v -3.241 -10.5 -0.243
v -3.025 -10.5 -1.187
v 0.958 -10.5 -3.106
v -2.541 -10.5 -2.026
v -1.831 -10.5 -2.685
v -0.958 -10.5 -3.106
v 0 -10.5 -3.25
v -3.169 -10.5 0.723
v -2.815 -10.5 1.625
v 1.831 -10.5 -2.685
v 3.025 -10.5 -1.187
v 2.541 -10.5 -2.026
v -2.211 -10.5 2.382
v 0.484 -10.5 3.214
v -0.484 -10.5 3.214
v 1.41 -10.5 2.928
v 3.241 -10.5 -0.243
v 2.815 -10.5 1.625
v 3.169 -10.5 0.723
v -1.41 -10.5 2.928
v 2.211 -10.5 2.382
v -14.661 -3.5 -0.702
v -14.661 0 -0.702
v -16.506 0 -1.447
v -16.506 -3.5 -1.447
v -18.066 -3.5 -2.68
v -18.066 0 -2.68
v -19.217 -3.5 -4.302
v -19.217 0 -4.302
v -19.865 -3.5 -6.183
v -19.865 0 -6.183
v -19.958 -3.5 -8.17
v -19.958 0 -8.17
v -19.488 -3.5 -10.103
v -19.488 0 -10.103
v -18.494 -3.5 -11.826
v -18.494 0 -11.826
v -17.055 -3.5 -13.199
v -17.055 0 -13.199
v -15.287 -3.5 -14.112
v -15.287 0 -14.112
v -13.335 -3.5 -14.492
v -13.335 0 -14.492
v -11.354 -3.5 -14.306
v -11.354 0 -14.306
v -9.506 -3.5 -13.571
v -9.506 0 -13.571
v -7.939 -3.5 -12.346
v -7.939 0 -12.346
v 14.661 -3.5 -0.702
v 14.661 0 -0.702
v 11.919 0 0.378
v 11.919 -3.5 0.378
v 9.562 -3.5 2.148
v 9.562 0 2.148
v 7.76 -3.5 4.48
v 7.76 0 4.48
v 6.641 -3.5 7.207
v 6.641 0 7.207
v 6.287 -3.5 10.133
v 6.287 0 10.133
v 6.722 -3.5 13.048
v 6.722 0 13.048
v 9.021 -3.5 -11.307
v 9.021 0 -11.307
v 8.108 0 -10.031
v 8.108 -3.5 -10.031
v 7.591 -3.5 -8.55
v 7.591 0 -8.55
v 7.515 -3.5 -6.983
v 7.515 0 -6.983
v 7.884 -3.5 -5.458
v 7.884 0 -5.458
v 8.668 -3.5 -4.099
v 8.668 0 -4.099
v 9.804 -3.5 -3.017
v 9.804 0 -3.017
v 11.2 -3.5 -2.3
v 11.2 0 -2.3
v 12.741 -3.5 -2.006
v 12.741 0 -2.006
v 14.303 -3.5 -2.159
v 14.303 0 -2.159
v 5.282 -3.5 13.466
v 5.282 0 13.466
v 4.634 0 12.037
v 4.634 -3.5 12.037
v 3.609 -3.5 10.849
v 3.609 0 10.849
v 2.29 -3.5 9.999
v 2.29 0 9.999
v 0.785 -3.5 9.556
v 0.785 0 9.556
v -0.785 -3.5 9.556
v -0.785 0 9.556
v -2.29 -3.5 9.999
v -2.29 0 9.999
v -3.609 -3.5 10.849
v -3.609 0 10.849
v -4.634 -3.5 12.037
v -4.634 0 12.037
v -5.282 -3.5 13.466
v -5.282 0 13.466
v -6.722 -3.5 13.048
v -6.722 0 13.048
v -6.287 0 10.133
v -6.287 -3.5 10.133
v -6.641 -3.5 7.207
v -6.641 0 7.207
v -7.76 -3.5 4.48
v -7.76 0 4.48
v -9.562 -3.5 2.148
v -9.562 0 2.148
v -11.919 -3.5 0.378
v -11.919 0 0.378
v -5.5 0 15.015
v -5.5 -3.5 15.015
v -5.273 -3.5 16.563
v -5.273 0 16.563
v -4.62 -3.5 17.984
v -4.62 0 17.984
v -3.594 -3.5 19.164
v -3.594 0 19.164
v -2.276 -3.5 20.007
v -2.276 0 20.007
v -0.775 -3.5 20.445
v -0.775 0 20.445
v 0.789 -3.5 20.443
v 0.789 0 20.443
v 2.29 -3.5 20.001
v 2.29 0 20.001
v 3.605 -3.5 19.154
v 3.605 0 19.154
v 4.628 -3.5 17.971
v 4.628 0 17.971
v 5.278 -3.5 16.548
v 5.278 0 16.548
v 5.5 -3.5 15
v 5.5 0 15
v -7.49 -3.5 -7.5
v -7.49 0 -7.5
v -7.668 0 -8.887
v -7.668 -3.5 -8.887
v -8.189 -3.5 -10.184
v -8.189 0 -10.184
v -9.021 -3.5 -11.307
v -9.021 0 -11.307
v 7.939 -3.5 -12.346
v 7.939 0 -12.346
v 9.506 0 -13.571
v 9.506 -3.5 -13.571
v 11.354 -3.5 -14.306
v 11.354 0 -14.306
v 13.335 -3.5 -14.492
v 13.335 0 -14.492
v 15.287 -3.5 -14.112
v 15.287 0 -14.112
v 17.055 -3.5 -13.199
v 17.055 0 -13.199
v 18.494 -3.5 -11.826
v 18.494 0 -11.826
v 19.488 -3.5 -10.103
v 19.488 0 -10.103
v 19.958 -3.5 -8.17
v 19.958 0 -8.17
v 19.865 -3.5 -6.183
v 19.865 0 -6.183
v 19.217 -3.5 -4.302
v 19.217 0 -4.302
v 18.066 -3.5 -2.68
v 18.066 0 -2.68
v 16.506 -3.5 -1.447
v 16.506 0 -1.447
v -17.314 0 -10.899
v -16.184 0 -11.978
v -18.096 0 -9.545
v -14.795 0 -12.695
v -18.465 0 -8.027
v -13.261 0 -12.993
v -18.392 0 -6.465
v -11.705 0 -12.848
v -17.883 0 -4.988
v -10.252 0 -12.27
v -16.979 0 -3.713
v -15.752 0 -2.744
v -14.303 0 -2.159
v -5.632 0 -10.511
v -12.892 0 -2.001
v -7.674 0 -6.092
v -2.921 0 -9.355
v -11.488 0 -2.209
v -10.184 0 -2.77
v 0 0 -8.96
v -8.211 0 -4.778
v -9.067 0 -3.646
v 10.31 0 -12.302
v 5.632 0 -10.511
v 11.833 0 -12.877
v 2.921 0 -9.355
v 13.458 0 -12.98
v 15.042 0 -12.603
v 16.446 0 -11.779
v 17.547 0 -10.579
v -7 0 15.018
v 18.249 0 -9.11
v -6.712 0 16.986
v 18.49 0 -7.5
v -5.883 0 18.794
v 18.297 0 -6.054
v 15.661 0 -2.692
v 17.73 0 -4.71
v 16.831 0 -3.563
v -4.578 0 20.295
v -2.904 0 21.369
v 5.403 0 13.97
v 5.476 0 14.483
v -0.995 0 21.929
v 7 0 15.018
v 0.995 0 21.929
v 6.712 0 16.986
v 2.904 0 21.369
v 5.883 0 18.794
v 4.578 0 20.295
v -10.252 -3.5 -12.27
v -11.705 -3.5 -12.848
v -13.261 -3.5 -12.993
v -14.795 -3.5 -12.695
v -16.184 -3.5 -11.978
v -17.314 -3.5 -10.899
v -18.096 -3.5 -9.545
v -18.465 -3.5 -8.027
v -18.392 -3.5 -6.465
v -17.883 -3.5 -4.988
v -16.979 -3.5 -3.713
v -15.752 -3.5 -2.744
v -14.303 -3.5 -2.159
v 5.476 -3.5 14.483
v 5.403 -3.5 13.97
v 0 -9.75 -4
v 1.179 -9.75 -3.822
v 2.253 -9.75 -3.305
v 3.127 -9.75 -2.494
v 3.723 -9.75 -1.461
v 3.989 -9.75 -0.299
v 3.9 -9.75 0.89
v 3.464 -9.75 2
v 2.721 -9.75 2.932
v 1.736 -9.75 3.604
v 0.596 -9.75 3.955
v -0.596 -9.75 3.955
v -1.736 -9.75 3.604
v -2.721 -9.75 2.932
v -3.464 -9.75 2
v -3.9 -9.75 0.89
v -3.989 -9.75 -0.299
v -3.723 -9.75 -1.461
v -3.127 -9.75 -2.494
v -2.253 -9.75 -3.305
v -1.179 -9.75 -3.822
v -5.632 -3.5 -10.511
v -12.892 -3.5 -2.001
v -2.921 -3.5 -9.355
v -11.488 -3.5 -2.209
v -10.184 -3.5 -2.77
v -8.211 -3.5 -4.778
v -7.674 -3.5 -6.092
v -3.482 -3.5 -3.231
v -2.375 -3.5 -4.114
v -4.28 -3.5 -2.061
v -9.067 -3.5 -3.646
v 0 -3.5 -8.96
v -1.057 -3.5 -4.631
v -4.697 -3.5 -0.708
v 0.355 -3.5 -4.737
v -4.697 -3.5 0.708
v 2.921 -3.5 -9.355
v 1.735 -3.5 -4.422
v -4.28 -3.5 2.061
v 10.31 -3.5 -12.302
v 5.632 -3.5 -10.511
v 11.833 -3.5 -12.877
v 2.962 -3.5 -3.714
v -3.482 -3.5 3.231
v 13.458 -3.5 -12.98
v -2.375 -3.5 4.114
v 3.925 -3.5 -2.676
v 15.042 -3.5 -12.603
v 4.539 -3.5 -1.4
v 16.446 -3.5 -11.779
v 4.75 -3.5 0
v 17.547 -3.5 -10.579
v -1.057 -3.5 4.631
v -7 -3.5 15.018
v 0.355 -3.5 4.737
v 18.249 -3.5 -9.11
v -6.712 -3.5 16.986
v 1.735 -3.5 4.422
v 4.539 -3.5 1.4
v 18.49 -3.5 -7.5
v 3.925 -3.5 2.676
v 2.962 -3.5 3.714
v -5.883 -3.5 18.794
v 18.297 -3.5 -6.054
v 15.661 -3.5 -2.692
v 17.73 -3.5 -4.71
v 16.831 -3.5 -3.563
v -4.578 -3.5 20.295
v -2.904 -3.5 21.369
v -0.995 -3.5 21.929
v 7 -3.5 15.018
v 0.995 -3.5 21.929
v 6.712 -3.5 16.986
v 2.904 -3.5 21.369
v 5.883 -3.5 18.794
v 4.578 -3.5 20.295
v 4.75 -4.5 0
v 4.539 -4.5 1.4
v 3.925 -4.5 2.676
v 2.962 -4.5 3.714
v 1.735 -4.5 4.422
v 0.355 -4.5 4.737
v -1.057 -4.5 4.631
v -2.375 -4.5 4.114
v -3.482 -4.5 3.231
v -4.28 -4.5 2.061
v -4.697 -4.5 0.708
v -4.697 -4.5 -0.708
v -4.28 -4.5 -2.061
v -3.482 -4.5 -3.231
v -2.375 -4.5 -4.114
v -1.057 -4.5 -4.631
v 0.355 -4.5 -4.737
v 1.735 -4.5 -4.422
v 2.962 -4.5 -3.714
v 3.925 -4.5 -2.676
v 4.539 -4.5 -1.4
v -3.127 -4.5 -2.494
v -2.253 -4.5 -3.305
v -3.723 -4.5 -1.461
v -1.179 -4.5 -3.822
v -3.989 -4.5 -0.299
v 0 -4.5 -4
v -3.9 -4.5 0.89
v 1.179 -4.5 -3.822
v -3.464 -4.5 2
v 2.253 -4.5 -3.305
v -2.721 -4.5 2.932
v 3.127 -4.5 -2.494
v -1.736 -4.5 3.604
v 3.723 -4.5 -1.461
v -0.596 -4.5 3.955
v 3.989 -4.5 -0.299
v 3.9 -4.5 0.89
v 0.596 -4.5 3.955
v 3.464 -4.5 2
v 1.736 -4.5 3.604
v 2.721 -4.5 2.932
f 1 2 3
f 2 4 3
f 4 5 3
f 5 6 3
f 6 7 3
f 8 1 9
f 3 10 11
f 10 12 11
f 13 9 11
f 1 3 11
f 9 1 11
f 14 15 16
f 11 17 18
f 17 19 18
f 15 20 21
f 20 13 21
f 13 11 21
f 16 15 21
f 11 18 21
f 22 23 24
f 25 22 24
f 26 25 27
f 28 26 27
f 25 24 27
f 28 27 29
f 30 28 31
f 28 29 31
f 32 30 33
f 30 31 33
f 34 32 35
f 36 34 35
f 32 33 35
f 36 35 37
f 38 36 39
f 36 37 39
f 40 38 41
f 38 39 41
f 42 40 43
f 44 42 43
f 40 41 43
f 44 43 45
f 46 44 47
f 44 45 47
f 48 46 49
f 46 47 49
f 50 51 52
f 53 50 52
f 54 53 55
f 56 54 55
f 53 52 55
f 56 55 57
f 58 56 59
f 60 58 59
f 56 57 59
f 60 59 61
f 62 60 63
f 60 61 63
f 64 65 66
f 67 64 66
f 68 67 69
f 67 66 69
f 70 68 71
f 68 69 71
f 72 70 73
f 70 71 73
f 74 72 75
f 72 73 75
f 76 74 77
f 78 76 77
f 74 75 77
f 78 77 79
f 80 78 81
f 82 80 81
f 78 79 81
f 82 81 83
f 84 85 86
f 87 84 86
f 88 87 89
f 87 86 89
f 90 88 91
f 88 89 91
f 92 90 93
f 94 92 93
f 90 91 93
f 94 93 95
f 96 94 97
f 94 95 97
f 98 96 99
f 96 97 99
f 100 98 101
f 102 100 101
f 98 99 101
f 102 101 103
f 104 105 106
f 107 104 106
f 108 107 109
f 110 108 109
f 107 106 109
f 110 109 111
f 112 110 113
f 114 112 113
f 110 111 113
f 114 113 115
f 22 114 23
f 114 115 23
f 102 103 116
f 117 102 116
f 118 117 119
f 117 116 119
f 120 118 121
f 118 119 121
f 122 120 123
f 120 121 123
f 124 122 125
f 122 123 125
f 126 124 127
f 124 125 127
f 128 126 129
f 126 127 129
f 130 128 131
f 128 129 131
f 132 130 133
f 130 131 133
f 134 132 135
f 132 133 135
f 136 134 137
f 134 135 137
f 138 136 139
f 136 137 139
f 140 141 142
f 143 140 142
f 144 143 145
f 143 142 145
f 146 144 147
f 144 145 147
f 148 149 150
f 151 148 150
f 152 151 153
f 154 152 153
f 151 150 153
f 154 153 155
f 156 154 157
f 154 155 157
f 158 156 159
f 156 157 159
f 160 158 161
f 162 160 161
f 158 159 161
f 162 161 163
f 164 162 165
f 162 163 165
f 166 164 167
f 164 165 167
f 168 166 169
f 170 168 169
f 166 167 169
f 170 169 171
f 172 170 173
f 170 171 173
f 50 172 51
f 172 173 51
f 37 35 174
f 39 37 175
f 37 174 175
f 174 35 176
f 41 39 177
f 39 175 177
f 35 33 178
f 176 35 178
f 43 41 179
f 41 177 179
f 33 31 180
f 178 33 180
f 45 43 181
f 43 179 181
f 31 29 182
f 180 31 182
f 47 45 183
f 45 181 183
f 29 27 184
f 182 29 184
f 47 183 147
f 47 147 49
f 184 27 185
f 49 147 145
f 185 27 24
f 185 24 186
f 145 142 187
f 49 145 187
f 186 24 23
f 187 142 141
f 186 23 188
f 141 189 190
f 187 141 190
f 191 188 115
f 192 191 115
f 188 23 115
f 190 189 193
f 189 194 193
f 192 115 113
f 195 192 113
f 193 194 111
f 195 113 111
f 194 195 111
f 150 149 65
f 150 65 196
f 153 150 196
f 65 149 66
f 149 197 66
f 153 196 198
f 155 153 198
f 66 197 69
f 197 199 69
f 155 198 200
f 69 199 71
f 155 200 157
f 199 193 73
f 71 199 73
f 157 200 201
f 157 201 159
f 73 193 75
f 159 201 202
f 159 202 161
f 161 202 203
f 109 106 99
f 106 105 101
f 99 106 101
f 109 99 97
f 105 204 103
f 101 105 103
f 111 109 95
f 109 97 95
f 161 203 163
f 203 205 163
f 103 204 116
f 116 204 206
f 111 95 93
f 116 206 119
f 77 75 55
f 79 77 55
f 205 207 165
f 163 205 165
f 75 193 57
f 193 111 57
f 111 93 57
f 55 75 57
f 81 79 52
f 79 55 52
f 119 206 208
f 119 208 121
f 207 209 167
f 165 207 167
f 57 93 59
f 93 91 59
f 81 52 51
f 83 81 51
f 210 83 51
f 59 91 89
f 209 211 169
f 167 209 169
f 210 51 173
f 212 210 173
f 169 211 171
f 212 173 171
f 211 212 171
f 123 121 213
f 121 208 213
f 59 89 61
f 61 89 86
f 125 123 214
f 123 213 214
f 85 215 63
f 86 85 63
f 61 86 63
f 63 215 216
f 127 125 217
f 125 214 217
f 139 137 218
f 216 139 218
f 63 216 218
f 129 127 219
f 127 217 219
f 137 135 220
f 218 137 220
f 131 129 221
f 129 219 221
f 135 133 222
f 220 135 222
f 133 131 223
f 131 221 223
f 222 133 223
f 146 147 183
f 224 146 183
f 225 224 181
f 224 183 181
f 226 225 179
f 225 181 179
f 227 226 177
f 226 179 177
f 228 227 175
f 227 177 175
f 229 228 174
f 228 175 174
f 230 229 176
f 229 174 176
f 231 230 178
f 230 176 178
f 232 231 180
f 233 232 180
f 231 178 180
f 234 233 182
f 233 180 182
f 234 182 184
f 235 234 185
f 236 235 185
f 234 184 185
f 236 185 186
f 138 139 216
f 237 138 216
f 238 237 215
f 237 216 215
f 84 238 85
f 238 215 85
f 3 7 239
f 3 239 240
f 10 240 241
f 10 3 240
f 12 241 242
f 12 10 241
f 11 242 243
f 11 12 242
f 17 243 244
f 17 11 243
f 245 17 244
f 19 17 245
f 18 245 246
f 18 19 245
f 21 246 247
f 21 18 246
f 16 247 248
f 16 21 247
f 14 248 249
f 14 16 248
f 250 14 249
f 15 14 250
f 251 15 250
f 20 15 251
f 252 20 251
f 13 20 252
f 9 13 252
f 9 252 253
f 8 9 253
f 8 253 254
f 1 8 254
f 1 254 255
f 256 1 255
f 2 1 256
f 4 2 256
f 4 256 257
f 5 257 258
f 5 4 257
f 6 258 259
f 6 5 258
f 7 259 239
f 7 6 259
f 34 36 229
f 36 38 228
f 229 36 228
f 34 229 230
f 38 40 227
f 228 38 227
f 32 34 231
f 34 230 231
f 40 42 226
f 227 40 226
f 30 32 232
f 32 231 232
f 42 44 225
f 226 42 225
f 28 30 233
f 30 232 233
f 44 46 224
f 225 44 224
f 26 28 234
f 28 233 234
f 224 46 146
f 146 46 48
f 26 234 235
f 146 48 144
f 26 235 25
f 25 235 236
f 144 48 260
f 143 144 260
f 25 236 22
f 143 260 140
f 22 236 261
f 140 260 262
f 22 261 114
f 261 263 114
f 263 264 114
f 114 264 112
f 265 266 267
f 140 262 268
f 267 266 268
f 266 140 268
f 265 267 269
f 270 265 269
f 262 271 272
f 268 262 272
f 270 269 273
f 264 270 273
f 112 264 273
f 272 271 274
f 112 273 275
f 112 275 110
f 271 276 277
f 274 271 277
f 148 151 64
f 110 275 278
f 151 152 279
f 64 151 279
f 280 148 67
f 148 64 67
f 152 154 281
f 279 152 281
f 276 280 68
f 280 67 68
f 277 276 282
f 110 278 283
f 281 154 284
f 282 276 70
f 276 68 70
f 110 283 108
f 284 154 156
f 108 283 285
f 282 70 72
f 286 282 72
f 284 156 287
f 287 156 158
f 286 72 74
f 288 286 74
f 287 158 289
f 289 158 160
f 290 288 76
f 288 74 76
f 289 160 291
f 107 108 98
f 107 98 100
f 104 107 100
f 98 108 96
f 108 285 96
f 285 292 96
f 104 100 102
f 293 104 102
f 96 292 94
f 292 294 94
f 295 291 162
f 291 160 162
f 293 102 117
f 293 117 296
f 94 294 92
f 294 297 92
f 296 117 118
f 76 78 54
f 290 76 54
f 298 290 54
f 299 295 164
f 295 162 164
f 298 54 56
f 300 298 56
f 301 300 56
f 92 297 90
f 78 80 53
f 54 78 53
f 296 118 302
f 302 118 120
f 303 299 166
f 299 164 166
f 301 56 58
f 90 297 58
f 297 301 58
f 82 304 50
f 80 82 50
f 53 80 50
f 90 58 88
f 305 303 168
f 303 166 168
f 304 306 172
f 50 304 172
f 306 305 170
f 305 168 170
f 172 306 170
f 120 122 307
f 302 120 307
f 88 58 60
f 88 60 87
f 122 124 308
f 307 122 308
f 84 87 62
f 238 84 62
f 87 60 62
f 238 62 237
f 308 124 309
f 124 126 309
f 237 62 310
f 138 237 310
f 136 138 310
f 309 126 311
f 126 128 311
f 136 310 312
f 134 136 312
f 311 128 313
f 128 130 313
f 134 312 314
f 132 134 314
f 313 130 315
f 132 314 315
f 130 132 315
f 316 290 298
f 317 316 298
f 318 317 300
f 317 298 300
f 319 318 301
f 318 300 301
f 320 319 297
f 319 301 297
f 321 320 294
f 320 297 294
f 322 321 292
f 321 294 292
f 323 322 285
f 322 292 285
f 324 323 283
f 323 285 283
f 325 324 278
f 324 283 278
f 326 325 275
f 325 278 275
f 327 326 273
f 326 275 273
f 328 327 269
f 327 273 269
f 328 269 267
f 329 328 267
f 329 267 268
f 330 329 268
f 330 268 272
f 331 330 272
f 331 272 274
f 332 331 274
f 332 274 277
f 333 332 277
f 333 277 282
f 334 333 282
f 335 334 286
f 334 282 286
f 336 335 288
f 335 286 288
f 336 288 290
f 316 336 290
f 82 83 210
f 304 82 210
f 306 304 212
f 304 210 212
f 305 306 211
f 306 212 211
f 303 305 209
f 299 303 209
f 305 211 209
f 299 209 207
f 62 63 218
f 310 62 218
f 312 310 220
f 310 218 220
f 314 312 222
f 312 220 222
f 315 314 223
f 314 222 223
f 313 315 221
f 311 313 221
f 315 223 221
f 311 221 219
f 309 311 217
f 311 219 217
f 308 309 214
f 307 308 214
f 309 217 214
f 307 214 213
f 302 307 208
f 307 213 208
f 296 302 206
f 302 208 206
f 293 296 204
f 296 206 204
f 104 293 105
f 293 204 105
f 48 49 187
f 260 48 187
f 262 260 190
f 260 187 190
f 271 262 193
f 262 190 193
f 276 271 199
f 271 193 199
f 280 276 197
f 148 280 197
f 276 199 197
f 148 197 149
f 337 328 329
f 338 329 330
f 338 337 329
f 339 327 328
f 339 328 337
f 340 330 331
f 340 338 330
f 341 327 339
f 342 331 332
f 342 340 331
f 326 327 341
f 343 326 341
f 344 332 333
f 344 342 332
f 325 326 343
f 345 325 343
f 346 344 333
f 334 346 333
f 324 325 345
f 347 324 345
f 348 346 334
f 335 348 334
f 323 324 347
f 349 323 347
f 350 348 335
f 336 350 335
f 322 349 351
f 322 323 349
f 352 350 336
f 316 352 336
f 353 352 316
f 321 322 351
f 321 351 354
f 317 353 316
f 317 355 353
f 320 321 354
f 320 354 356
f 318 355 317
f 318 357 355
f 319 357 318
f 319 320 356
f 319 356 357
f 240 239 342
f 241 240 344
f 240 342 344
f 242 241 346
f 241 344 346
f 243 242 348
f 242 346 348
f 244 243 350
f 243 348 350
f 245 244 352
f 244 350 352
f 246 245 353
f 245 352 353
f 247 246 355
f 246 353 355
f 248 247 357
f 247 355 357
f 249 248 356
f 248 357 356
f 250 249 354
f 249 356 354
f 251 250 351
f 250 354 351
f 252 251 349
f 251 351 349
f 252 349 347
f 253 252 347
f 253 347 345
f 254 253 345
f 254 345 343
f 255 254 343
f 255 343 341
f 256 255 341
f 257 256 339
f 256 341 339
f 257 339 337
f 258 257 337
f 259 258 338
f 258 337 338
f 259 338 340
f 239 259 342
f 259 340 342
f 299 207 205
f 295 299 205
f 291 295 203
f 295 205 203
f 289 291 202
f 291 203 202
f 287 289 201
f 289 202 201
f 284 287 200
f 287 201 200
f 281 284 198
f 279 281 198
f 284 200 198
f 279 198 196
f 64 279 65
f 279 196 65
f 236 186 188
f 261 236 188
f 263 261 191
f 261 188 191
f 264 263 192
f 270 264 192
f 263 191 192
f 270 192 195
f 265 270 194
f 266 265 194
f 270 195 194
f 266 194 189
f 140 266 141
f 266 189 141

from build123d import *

# Parameters (mm, degrees)
F0_R     = 11
F1_DEPTH = 7
F2_SCALE = 0.5
F5_R     = 4.75
F5_R_2   = 4
F6_DEPTH = 1
F7_SIZE  = 0.75


with BuildPart() as f1:
    # F0 (on Front) → F1 (new body)
    with BuildSketch(Plane.XZ):
        with BuildLine():
            ThreePointArc((29.3216524239, -1.4044694133), (15.5190640284, 8.9599357944), (13.4445200212, 26.0955305867))
            ThreePointArc((13.4445200212, 26.0955305867), (0, 44), (-13.4445200212, 26.0955305867))
            ThreePointArc((-13.4445200212, 26.0955305867), (-15.5190640284, 8.9599357944), (-29.3216524239, -1.4044694133))
            ThreePointArc((-29.3216524239, -1.4044694133), (-38.1051177665, -22), (-15.8771324027, -24.6910611734))
            ThreePointArc((-15.8771324027, -24.6910611734), (0, -17.9198715888), (15.8771324027, -24.6910611734))
            ThreePointArc((15.8771324027, -24.6910611734), (38.1051177665, -22), (29.3216524239, -1.4044694133))
        make_face()
        with BuildLine():
            ThreePointArc((11, 30), (10.8903412687, 28.4506559287), (10.5635514452, 26.9322026038))
            ThreePointArc((10.5635514452, 26.9322026038), (12.9209878171, 7.4599357944), (28.6057473574, -4.3177973962))
            ThreePointArc((28.6057473574, -4.3177973962), (34.6374022725, -8.2130580407), (36.9807621135, -15))
            ThreePointArc((36.9807621135, -15), (30.084161423, -25.2059842302), (18.0421959122, -22.6144052077))
            ThreePointArc((18.0421959122, -22.6144052077), (0, -14.9198715888), (-18.0421959122, -22.6144052077))
            ThreePointArc((-18.0421959122, -22.6144052077), (-35.5070415552, -20.5), (-28.6057473574, -4.3177973962))
            ThreePointArc((-28.6057473574, -4.3177973962), (-12.9209878171, 7.4599357944), (-10.5635514452, 26.9322026038))
            ThreePointArc((-10.5635514452, 26.9322026038), (-1.5493440713, 40.8903412687), (11, 30))
        make_face(mode=Mode.SUBTRACT)
        with BuildLine():
            ThreePointArc((28.6057473574, -4.3177973962), (12.9209878171, 7.4599357944), (10.5635514452, 26.9322026038))
            ThreePointArc((10.5635514452, 26.9322026038), (0, 19), (-10.5635514452, 26.9322026038))
            ThreePointArc((-10.5635514452, 26.9322026038), (-12.9209878171, 7.4599357944), (-28.6057473574, -4.3177973962))
            ThreePointArc((-28.6057473574, -4.3177973962), (-19.1938201542, -6.3433598411), (-14.9807621135, -15))
            ThreePointArc((-14.9807621135, -15), (-15.7747778833, -19.1033993094), (-18.0421959122, -22.6144052077))
            ThreePointArc((-18.0421959122, -22.6144052077), (0, -14.9198715888), (18.0421959122, -22.6144052077))
            ThreePointArc((18.0421959122, -22.6144052077), (16.4544826719, -9.5), (28.6057473574, -4.3177973962))
        make_face()
        Circle(F0_R, mode=Mode.SUBTRACT)
    extrude(amount=F1_DEPTH)


with BuildPart() as f1_1:
    # F2: moved
    add(f1.part.scale(F2_SCALE))

    # F3 (on Right) → F4 (revolve)
    with BuildSketch(Plane.YZ):
        Polygon((-10.5, -4), (-3.5, -4), (-3.5, -0.7022347066), (-3.5, 0), (-10.5, 0), align=None)
        Polygon((-3.5, -4), (-3.5, -5.5), (0, -5.5), (0, 0), (-3.5, 0), (-3.5, -0.7022347066), align=None)
    revolve(axis=Axis((0, -7, 0), (0, -1, 0)))

    # F5 (on face) → F6 (join)
    with BuildSketch(Plane.XZ.offset(3.5)):
        Circle(F5_R)
        Circle(F5_R_2, mode=Mode.SUBTRACT)
    extrude(amount=F6_DEPTH)

    # F7
    f7_edges = [f1_1.edges().sort_by_distance(p)[0] for p in [
        (0, -10.5, 4),
    ]]
    chamfer(f7_edges, length=F7_SIZE)


solid = f1_1.part
